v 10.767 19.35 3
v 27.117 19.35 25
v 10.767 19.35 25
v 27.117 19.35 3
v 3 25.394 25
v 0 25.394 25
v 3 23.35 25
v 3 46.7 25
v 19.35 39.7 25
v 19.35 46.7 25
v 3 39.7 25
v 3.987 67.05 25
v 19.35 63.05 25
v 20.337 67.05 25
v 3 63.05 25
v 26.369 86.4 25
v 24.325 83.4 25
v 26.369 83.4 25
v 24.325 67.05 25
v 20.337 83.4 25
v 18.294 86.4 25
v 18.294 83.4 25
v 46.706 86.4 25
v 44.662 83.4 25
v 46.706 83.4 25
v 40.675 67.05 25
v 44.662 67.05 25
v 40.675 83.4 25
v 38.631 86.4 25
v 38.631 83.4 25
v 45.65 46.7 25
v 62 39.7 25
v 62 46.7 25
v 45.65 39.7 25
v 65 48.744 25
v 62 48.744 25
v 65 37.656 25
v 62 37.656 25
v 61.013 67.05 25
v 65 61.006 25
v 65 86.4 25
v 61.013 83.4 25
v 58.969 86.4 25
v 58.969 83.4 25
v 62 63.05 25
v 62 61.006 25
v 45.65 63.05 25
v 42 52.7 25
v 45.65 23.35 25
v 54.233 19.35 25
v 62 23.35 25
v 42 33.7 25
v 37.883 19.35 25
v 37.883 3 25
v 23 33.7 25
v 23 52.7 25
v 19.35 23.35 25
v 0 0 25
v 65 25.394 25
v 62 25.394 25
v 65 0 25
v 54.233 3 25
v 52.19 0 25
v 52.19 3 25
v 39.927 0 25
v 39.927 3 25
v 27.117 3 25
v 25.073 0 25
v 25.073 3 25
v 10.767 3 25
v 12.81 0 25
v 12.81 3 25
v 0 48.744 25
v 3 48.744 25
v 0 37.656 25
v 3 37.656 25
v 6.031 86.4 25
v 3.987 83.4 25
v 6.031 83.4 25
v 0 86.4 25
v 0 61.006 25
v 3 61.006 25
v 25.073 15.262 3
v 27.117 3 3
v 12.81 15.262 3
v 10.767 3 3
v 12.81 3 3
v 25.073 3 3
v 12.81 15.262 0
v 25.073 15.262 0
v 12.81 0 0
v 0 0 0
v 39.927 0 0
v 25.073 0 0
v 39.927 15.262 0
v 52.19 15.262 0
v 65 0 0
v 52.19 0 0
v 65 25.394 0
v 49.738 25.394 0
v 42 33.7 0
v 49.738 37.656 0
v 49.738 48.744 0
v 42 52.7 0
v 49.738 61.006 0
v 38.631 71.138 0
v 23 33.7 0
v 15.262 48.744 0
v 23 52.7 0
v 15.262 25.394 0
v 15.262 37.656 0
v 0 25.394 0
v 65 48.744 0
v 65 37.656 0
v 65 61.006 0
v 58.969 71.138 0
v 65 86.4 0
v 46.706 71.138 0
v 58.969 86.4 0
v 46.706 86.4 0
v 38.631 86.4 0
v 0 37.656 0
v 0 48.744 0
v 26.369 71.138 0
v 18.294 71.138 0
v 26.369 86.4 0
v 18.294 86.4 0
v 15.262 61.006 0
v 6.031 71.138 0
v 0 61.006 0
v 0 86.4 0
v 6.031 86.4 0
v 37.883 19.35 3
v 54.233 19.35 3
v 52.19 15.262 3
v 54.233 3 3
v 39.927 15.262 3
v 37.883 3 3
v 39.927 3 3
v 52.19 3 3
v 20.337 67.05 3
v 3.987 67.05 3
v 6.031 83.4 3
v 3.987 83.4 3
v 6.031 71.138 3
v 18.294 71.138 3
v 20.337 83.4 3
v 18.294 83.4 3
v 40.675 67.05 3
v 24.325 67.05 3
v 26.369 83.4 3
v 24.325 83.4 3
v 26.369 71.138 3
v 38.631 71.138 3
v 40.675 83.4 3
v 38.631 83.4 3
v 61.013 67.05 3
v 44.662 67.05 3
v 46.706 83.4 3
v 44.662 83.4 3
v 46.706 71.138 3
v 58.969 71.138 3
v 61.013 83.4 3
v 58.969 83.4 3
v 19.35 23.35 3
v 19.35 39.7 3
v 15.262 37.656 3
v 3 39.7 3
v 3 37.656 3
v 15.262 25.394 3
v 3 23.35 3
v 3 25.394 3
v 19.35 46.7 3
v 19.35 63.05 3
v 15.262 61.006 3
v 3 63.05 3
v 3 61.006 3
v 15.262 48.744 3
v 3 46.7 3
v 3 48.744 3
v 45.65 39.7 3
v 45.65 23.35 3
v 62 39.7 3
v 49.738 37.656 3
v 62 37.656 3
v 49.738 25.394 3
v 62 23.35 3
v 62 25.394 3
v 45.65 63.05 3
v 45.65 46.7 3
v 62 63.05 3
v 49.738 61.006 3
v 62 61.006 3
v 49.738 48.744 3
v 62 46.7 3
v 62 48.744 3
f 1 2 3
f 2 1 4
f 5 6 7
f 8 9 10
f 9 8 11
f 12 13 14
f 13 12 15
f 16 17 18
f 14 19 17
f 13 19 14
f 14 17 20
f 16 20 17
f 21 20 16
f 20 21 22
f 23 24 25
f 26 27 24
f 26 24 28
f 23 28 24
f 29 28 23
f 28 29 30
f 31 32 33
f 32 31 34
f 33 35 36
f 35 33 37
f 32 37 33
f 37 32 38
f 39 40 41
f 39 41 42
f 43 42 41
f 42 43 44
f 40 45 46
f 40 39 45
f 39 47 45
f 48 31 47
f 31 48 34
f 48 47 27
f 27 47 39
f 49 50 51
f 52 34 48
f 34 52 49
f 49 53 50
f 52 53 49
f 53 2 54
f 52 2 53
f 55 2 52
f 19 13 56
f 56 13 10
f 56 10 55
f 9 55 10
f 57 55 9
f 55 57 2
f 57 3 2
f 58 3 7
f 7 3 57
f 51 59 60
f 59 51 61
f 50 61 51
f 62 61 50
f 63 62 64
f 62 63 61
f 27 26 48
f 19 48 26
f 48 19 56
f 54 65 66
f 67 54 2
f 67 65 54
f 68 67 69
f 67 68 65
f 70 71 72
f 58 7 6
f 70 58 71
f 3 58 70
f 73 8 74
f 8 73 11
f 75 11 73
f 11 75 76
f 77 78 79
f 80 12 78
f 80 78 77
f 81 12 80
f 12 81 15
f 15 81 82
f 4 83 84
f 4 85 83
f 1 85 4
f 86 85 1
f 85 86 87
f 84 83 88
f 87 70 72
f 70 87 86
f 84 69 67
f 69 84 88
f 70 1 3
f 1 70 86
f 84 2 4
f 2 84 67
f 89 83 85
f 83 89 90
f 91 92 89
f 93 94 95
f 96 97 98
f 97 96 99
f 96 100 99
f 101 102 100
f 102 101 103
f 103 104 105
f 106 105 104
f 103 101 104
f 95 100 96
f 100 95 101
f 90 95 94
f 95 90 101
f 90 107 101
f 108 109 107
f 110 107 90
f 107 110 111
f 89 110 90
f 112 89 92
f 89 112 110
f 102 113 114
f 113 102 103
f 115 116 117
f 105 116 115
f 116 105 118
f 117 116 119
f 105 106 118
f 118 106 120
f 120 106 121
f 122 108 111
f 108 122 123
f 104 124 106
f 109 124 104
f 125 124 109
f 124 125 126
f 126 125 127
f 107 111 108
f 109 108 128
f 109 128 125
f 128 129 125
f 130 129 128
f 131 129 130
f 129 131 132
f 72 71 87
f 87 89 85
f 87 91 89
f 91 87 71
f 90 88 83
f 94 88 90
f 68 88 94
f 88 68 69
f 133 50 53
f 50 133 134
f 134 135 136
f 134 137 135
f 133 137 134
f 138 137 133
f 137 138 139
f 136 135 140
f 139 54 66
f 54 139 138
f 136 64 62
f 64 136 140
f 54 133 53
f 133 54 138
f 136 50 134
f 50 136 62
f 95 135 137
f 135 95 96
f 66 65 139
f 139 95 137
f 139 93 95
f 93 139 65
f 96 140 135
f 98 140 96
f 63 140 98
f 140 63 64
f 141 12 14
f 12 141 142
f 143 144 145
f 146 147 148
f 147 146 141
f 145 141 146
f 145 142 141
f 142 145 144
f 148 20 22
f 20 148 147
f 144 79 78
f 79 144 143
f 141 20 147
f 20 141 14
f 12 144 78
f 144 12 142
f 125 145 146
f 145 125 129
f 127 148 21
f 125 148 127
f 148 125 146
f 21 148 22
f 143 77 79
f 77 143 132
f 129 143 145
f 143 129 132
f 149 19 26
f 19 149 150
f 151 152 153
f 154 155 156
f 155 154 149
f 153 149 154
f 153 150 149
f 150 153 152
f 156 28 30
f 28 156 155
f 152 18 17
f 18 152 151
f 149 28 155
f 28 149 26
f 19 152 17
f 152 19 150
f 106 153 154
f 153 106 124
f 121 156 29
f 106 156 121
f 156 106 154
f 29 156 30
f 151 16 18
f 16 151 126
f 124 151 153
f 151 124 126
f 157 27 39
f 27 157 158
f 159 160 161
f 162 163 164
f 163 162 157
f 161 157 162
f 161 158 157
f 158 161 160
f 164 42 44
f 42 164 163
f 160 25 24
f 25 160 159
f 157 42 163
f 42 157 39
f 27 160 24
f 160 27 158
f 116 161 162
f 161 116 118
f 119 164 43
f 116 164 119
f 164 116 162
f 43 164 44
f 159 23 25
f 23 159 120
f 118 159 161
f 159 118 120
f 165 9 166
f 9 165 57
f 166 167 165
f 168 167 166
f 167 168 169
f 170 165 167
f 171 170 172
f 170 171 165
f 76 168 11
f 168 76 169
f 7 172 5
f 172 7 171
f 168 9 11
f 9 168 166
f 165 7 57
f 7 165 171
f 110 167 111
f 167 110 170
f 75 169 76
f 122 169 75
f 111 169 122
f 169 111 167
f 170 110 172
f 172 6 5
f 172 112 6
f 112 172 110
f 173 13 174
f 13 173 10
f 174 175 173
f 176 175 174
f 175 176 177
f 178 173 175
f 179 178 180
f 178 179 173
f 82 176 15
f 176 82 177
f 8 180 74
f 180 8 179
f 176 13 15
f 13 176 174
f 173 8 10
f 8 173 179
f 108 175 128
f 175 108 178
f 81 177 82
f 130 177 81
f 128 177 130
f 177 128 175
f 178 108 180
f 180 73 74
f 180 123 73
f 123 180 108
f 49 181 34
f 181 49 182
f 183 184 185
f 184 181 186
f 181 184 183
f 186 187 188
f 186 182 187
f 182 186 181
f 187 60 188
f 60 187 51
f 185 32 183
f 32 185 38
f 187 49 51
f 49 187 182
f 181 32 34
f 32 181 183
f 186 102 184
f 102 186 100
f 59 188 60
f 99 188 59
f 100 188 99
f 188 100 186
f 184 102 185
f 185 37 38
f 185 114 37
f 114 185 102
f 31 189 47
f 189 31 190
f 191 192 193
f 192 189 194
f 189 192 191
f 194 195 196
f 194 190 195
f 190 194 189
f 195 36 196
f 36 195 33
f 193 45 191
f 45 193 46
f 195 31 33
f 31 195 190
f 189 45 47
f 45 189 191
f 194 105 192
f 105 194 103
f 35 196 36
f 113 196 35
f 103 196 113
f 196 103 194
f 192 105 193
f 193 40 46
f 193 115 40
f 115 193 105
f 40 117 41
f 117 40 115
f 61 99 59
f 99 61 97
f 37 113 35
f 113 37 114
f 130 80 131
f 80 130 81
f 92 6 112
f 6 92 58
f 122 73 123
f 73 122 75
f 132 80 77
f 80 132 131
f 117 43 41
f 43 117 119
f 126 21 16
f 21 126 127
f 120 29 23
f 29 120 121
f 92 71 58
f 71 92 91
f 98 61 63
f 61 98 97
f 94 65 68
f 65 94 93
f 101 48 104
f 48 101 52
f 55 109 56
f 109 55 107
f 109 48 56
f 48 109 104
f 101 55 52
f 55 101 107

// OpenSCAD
// file: ColonistsGoodsLib.scad
singleGoodPileHeight = 2.15;
singleGoodPileWidth = 15.05 + 1.3;
singleGoodPileLength = 15.05 + 1.3;
goodPileCount = 10;
goodPileHeight = (goodPileCount * singleGoodPileHeight) + .5;
module LeftGoodPile(wallThickness, totalHeight){
//    15.05 by 14.95 by 2.15

    openingSize = singleGoodPileWidth * .75;
    blockerSize = (singleGoodPileLength - openingSize) / 2;
    
    translate([wallThickness, wallThickness, totalHeight - goodPileHeight])
        cube([singleGoodPileLength, singleGoodPileWidth, goodPileHeight]);
    translate([-.00001, wallThickness + (blockerSize), 0])
        cube([wallThickness + openingSize, openingSize, totalHeight]);
}

module RightGoodPile(wallThickness, totalHeight){
    translate([0, wallThickness + wallThickness + singleGoodPileWidth, 0])
        rotate([0, 0, 180])
            LeftGoodPile(wallThickness, totalHeight);
}

module BottomGoodPile(wallThickness, totalHeight){
    translate([wallThickness + wallThickness + singleGoodPileWidth, 0, 0])
        rotate([0, 0, 90])
            LeftGoodPile(wallThickness, totalHeight);
}

module TopGoodPile(wallThickness, totalHeight){
//    translate([
//        wallThickness + wallThickness + singleGoodPileWidth,
//        wallThickness + wallThickness + singleGoodPileWidth,
//        0])
        rotate([0, 0, 270])
            LeftGoodPile(wallThickness, totalHeight);
}
// main file
include<ColonistsGoodsLib.scad>
    magnetHoleWidth = 19;
    floorThickness = 3;
    wallThickness = 3;
    height = goodPileHeight + floorThickness;
    length = 65;
    width = (singleGoodPileLength + wallThickness) * 4 + wallThickness * 3;
    numberOfTopBoxes = 3;
    numberOfBottomBoxes = 2;
    numberOfLeftBoxes = 2;
    numberOfRightBoxes = 2;

difference() {

//    whitespace between boxes = (total length - (# of boxes * width of boxes)) / (# of boxes + 1)
//    position of box n = whitespace * n + 1 + width of box * (n)
    
    cube([length, width, height]);

    whiteSpaceBetweenTopBoxes = whiteSpaceBetweenBoxes(length, numberOfTopBoxes, singleGoodPileLength);
    whiteSpaceBetweenBottomBoxes = whiteSpaceBetweenBoxes(length, numberOfBottomBoxes, singleGoodPileLength);
    remainingWidth = width - (2 * singleGoodPileWidth);
    whiteSpaceBetweenLeftBoxes = whiteSpaceBetweenBoxes(remainingWidth, numberOfLeftBoxes, singleGoodPileLength);
    whiteSpaceBetweenRightBoxes = whiteSpaceBetweenBoxes(remainingWidth, numberOfRightBoxes, singleGoodPileLength);

    for(i=[0:numberOfBottomBoxes - 1]){
        translate([((i + 1) * whiteSpaceBetweenBottomBoxes + singleGoodPileLength * (i)) - wallThickness, 0, 0])
            BottomGoodPile(wallThickness, height);
    }
    for(i=[0:numberOfTopBoxes - 1]){
        translate([((i + 1) * whiteSpaceBetweenTopBoxes + singleGoodPileLength * (i)) - wallThickness, width, 0])
            TopGoodPile(wallThickness, height);
    }
    
    for(i=[0:numberOfLeftBoxes - 1]){
        translate([0, singleGoodPileLength + ((i + 1) * whiteSpaceBetweenLeftBoxes + singleGoodPileLength * (i)) - wallThickness, 0])
            LeftGoodPile(wallThickness, height);
    }
    for(i=[0:numberOfRightBoxes - 1]){
        translate([length, singleGoodPileLength + ((i + 1) * whiteSpaceBetweenRightBoxes + singleGoodPileLength * (i)) - wallThickness, 0])
            RightGoodPile(wallThickness, height);
    }
    
    
    translate([length/2 - magnetHoleWidth/2, width/2 - magnetHoleWidth/2, 0])
        cube([magnetHoleWidth, magnetHoleWidth, height]);
}

function whiteSpaceBetweenBoxes(side, numberOfBoxes, boxLength) =
    (side - (numberOfBoxes * boxLength)) / (numberOfBoxes + 1);
